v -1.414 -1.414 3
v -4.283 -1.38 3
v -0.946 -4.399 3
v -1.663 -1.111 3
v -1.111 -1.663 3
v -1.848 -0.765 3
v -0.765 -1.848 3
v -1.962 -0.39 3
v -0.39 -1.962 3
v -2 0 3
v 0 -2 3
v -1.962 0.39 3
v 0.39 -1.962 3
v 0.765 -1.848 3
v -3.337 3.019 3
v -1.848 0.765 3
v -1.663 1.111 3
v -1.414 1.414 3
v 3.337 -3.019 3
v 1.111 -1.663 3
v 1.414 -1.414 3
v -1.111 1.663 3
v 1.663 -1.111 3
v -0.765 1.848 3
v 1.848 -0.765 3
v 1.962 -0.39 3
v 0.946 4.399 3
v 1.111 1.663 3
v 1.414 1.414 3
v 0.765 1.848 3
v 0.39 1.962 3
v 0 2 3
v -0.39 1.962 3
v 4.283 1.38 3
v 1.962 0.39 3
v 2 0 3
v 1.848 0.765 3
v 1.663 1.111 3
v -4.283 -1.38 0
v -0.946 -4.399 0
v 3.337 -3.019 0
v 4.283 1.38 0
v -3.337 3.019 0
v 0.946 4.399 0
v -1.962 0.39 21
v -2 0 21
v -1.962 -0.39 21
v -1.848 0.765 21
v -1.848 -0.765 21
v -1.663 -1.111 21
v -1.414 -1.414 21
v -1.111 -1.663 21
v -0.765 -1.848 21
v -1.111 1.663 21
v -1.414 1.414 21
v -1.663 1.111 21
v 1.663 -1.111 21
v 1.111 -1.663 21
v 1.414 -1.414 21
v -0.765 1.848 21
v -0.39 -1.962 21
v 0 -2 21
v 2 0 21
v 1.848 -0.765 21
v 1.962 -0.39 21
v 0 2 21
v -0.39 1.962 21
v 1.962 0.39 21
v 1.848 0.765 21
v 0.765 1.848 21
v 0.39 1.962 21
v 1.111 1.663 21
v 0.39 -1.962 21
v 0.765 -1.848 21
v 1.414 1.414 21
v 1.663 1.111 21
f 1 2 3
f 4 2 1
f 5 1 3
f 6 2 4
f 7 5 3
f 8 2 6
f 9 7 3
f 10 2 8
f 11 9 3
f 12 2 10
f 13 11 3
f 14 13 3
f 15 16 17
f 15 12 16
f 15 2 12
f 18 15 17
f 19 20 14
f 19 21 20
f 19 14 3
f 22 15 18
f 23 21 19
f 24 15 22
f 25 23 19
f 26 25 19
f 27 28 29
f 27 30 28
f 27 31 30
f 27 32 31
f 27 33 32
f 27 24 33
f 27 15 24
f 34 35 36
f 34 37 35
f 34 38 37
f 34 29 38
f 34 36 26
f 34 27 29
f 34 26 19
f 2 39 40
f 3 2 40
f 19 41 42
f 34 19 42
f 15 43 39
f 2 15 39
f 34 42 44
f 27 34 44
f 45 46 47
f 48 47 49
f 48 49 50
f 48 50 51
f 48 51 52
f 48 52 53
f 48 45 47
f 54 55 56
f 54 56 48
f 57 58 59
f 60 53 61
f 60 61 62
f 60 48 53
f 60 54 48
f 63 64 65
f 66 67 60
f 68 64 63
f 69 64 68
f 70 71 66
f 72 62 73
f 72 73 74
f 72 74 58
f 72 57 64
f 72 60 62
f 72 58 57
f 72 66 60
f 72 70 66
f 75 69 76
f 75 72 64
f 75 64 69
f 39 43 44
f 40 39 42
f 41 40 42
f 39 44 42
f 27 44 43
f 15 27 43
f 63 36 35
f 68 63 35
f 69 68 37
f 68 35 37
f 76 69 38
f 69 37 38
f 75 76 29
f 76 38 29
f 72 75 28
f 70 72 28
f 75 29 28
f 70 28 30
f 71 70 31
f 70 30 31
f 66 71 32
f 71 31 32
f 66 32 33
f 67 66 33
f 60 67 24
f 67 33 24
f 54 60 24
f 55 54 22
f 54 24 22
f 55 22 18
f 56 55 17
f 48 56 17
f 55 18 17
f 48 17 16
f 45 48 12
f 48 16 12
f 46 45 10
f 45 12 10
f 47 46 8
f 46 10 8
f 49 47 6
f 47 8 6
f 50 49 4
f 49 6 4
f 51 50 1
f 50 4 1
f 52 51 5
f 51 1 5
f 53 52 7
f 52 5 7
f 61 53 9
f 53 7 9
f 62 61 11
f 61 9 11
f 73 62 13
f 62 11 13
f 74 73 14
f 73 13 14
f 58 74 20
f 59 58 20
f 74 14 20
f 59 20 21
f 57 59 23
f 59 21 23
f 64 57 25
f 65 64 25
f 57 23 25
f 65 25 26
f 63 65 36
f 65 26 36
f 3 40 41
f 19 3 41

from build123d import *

# Parameters (mm, degrees)
BOSS_EXTRUDE1_DEPTH = 3
SKETCH2_R           = 2
BOSS_EXTRUDE2_DEPTH = 18


with BuildPart() as part:
    # Sketch1 → Boss-Extrude1 (new body)
    with BuildSketch(Plane.XY):
        Polygon((3.33681456, -3.019216553), (4.283125514, 1.3801579), (0.946310955, 4.399374453), (-3.33681456, 3.019216553), (-4.283125514, -1.3801579), (-0.946310955, -4.399374453), align=None)
    extrude(amount=BOSS_EXTRUDE1_DEPTH)

    # Sketch2 → Boss-Extrude2 (add)
    with BuildSketch(Plane.XY.offset(3)):
        Circle(SKETCH2_R)
    extrude(amount=BOSS_EXTRUDE2_DEPTH)


solid = part.part
